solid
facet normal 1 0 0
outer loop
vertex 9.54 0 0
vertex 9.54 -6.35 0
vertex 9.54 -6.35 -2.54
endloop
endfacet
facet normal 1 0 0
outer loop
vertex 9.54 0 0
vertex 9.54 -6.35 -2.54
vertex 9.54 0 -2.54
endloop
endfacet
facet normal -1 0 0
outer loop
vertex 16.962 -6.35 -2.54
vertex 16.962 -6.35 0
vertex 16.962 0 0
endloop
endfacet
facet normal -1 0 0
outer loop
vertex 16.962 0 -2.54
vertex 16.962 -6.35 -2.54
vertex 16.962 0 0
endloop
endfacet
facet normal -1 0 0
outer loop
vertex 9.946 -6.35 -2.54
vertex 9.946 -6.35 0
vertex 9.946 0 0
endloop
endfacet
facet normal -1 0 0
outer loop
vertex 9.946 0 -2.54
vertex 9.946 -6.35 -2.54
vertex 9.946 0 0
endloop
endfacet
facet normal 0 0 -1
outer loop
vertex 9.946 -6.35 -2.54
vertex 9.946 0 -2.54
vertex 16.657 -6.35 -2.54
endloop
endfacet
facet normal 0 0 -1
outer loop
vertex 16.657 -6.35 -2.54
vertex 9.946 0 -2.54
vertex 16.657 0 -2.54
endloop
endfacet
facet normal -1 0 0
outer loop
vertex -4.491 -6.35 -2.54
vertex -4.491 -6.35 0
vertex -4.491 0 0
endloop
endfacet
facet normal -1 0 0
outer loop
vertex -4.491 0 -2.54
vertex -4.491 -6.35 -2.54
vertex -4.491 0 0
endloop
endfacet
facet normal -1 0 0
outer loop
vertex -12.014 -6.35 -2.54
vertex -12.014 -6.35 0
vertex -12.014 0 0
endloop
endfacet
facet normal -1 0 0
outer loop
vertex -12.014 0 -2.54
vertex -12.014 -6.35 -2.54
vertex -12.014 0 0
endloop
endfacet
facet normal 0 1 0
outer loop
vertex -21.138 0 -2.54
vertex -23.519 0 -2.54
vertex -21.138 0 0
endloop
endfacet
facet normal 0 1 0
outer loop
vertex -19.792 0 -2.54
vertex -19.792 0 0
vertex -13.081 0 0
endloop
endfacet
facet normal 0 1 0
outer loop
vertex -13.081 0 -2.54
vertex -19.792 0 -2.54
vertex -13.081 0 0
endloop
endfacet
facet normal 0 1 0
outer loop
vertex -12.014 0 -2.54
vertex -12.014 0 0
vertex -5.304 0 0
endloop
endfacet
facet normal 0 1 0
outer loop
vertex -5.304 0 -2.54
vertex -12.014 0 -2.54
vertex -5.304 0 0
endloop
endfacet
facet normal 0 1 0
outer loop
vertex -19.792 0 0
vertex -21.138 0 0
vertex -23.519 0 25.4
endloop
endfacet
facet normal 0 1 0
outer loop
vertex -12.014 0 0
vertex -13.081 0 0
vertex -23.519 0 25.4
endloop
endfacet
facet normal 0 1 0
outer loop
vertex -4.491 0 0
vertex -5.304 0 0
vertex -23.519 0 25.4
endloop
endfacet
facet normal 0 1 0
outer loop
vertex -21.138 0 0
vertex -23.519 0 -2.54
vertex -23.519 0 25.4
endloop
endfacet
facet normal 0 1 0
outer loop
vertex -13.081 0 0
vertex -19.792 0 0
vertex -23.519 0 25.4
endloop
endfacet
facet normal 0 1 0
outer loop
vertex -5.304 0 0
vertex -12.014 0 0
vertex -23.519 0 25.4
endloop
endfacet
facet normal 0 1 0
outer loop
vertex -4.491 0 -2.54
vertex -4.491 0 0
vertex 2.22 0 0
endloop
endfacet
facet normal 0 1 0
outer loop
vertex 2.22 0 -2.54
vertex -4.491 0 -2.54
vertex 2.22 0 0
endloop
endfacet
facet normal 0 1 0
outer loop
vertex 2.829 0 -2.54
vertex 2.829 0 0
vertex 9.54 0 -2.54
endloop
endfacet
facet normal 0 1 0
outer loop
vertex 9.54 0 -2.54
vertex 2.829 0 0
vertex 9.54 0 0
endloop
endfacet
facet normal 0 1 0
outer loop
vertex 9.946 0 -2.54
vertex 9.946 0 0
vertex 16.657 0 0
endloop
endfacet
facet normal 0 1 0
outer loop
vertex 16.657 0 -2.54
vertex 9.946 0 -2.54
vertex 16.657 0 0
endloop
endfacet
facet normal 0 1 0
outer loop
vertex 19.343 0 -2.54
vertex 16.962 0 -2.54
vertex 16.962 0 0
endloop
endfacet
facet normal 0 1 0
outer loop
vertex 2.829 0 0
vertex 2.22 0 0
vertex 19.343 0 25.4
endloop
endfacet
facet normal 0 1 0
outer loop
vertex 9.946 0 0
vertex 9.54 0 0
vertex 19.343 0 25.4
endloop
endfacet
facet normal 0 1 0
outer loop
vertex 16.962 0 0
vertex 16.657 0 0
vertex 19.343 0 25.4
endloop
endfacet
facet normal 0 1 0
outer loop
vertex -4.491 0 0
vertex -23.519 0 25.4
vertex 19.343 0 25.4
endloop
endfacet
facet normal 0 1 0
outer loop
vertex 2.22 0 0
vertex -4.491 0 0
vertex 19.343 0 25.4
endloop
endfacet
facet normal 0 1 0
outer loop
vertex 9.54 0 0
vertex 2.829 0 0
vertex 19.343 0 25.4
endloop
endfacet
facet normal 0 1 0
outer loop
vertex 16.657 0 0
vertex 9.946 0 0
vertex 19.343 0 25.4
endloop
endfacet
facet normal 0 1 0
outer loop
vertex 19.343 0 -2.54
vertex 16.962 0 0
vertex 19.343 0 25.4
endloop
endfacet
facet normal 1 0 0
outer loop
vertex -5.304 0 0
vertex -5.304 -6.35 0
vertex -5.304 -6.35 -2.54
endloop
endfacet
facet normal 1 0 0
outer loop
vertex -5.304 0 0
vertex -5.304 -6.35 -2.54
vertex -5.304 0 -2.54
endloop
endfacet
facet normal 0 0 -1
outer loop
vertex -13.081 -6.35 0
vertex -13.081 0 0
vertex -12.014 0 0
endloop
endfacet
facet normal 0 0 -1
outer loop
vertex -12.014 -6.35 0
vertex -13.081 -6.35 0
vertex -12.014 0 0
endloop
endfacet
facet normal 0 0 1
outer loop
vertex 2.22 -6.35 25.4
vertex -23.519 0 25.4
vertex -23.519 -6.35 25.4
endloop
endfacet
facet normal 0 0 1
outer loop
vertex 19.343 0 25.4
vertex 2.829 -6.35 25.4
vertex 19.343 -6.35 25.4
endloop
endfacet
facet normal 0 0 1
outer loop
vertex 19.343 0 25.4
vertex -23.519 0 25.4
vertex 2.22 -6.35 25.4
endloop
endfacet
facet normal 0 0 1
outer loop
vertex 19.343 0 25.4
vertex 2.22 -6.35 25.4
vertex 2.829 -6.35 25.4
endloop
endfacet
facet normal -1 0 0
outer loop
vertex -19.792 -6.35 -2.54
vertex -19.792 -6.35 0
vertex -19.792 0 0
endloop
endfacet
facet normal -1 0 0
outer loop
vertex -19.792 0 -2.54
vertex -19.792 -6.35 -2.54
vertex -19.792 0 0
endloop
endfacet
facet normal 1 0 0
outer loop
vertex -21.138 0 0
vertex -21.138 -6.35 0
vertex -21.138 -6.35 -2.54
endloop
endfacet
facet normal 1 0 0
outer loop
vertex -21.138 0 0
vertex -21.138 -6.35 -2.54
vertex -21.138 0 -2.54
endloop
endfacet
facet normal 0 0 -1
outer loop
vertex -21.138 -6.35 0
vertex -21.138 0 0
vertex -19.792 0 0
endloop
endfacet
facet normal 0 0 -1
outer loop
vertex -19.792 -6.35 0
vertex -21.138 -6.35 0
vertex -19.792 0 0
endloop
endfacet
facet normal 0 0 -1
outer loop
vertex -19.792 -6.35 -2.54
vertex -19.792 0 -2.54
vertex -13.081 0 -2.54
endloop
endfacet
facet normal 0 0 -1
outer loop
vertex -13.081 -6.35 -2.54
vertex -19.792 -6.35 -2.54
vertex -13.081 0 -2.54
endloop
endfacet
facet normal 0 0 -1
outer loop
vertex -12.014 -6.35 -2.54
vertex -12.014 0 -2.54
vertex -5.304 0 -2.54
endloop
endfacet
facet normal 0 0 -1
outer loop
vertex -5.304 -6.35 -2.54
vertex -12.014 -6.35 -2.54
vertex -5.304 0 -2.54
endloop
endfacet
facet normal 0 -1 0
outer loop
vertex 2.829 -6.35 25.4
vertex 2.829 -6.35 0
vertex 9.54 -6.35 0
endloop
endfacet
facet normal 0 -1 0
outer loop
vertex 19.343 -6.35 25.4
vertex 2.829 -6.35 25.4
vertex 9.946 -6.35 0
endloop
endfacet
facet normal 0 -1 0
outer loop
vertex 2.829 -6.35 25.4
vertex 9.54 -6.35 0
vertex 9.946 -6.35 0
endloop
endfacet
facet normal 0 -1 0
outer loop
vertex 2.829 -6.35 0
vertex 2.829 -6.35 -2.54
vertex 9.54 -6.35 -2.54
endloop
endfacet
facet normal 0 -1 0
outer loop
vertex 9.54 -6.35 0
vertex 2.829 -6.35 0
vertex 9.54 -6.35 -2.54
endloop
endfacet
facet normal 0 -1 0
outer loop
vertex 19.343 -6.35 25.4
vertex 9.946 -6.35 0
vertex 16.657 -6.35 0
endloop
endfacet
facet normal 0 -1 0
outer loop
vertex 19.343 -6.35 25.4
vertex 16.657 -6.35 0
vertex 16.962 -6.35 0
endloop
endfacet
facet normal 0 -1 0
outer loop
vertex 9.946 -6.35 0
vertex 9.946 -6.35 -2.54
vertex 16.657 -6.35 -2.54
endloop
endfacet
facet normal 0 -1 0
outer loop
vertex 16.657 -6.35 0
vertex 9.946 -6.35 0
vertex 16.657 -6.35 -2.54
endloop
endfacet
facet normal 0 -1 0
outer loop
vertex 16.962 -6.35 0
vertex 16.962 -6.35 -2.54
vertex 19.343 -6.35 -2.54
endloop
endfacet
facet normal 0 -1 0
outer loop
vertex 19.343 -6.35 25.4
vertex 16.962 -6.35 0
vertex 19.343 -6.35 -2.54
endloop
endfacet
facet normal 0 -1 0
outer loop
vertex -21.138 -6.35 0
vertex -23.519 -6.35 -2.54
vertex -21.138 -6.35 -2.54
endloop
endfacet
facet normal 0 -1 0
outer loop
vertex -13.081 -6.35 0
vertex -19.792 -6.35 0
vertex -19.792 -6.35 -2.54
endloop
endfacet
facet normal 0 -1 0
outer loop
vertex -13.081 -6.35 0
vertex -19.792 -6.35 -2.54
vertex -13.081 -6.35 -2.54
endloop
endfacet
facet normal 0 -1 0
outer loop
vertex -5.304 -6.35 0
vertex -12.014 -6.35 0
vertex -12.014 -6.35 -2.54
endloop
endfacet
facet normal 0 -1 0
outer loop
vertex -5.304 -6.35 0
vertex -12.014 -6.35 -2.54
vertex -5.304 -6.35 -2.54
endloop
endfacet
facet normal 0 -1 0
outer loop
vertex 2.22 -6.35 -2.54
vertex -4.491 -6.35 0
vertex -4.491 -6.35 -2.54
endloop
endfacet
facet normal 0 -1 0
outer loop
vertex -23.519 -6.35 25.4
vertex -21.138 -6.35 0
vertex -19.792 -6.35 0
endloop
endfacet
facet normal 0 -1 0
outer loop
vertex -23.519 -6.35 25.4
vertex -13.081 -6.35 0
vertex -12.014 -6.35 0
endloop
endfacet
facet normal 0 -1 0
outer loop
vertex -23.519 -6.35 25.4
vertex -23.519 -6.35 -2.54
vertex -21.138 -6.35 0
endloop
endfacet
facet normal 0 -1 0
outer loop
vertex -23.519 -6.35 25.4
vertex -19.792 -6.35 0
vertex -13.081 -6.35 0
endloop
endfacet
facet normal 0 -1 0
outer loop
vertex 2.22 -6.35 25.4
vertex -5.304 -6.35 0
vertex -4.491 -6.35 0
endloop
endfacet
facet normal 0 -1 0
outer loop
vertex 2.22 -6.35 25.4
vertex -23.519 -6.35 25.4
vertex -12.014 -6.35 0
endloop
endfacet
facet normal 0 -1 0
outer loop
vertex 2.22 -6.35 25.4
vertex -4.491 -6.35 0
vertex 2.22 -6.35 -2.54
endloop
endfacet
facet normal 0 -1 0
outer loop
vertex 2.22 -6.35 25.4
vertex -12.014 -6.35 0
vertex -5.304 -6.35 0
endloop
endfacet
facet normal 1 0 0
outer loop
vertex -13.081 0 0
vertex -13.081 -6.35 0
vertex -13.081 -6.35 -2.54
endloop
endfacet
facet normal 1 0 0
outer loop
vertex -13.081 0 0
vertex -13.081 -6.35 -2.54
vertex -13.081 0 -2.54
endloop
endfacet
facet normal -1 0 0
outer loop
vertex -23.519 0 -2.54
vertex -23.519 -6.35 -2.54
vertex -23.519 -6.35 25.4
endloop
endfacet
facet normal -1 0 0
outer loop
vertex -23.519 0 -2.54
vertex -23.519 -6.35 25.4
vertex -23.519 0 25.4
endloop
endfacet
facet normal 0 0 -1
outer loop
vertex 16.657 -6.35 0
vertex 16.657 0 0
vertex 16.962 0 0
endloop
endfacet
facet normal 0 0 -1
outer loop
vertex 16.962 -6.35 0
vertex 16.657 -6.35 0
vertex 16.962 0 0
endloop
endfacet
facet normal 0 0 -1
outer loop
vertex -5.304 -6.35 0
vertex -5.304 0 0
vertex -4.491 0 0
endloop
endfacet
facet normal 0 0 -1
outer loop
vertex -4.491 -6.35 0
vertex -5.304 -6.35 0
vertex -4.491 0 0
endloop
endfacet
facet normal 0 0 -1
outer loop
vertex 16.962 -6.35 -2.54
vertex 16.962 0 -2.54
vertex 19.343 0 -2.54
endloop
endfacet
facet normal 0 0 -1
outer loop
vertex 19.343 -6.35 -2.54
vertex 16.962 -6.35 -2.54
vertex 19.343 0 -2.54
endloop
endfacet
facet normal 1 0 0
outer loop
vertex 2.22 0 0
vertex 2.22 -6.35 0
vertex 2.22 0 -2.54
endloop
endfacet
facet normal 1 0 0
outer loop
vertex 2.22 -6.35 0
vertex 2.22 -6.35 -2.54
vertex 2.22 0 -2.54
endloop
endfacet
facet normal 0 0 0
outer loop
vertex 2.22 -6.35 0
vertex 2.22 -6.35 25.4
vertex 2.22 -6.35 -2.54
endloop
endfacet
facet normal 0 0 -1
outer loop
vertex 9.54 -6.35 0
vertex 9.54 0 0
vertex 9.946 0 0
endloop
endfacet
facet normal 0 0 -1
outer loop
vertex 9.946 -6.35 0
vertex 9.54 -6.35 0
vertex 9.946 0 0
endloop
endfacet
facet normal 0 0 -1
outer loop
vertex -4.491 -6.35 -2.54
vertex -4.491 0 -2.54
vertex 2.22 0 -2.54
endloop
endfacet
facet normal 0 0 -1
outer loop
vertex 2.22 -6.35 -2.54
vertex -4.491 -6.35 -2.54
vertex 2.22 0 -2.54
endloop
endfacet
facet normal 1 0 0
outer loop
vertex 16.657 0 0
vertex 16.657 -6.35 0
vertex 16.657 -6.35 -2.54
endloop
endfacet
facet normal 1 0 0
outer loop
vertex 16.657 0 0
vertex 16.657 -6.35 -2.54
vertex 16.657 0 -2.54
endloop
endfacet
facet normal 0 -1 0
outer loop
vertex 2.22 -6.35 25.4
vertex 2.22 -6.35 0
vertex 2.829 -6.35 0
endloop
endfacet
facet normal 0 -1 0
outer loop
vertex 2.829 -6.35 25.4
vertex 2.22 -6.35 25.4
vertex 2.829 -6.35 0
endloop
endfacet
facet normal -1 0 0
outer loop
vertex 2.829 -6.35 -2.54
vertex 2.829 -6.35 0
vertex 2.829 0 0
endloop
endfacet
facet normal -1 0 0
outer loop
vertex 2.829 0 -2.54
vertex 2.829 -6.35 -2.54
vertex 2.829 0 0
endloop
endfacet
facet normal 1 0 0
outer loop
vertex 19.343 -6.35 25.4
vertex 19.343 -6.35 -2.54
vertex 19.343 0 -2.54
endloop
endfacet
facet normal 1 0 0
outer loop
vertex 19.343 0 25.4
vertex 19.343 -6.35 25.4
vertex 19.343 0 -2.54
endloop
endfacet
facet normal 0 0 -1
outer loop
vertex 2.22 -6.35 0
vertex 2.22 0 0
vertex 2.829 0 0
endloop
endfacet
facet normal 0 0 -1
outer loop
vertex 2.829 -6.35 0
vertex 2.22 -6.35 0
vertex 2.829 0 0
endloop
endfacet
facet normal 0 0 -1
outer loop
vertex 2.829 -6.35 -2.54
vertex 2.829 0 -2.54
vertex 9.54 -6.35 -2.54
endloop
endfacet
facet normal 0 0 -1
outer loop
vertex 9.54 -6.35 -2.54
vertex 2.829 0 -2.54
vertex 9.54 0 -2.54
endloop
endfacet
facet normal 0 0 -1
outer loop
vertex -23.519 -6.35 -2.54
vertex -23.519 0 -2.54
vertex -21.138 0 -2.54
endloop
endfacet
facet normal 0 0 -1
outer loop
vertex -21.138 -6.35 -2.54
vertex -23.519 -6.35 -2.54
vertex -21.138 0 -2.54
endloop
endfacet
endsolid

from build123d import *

# Parameters (mm, degrees)
F0_W     = 2.38125
F0_H     = 6.35
F0_W_2   = 1.3462
F0_W_3   = 6.71068
F0_W_4   = 1.0668
F0_W_5   = 0.8128
F0_W_6   = 0.4064
F0_W_7   = 0.3048
F1_DEPTH = 25.4
F2_DEPTH = 2.54


# Not quite as in the source:
# - ends of sketch curves that miss each other by under 0.0002 mm in the source are joined


with BuildPart() as f1:
    # F0 (on Top) → F1 (new body)
    with BuildSketch(Plane.XY):
        with Locations((-22.328797859, -3.175)):
            Rectangle(F0_W, F0_H)
        with Locations((18.152452141, -3.175)):
            Rectangle(F0_W, F0_H)
        with Locations((-20.465072859, -3.175)):
            Rectangle(F0_W_2, F0_H)
        with Locations((-16.436632859, -3.175)):
            Rectangle(F0_W_3, F0_H)
        with Locations((-12.547892859, -3.175)):
            Rectangle(F0_W_4, F0_H)
        with Locations((-8.659152859, -3.175)):
            Rectangle(F0_W_3, F0_H)
        with Locations((-4.897412859, -3.175)):
            Rectangle(F0_W_5, F0_H)
        with Locations((-1.135672859, -3.175)):
            Rectangle(F0_W_3, F0_H)
        Polygon((2.829267141, 0), (2.219667141, 0), (2.219667141, -6.3499879551), (2.829267141, -6.35), align=None)
        with Locations((6.184607141, -3.175)):
            Rectangle(F0_W_3, F0_H)
        with Locations((9.743147141, -3.175)):
            Rectangle(F0_W_6, F0_H)
        with Locations((13.301687141, -3.175)):
            Rectangle(F0_W_3, F0_H)
        with Locations((16.809427141, -3.175)):
            Rectangle(F0_W_7, F0_H)
    extrude(amount=F1_DEPTH)

    # F0 (on Top) → F2 (join)
    with BuildSketch(Plane.XY):
        with Locations((-22.328797859, -3.175)):
            Rectangle(F0_W, F0_H)
        with Locations((-16.436632859, -3.175)):
            Rectangle(F0_W_3, F0_H)
        with Locations((-8.659152859, -3.175)):
            Rectangle(F0_W_3, F0_H)
        with Locations((-1.135672859, -3.175)):
            Rectangle(F0_W_3, F0_H)
        with Locations((6.184607141, -3.175)):
            Rectangle(F0_W_3, F0_H)
        with Locations((13.301687141, -3.175)):
            Rectangle(F0_W_3, F0_H)
        with Locations((18.152452141, -3.175)):
            Rectangle(F0_W, F0_H)
    extrude(amount=-F2_DEPTH)


solid = f1.part
